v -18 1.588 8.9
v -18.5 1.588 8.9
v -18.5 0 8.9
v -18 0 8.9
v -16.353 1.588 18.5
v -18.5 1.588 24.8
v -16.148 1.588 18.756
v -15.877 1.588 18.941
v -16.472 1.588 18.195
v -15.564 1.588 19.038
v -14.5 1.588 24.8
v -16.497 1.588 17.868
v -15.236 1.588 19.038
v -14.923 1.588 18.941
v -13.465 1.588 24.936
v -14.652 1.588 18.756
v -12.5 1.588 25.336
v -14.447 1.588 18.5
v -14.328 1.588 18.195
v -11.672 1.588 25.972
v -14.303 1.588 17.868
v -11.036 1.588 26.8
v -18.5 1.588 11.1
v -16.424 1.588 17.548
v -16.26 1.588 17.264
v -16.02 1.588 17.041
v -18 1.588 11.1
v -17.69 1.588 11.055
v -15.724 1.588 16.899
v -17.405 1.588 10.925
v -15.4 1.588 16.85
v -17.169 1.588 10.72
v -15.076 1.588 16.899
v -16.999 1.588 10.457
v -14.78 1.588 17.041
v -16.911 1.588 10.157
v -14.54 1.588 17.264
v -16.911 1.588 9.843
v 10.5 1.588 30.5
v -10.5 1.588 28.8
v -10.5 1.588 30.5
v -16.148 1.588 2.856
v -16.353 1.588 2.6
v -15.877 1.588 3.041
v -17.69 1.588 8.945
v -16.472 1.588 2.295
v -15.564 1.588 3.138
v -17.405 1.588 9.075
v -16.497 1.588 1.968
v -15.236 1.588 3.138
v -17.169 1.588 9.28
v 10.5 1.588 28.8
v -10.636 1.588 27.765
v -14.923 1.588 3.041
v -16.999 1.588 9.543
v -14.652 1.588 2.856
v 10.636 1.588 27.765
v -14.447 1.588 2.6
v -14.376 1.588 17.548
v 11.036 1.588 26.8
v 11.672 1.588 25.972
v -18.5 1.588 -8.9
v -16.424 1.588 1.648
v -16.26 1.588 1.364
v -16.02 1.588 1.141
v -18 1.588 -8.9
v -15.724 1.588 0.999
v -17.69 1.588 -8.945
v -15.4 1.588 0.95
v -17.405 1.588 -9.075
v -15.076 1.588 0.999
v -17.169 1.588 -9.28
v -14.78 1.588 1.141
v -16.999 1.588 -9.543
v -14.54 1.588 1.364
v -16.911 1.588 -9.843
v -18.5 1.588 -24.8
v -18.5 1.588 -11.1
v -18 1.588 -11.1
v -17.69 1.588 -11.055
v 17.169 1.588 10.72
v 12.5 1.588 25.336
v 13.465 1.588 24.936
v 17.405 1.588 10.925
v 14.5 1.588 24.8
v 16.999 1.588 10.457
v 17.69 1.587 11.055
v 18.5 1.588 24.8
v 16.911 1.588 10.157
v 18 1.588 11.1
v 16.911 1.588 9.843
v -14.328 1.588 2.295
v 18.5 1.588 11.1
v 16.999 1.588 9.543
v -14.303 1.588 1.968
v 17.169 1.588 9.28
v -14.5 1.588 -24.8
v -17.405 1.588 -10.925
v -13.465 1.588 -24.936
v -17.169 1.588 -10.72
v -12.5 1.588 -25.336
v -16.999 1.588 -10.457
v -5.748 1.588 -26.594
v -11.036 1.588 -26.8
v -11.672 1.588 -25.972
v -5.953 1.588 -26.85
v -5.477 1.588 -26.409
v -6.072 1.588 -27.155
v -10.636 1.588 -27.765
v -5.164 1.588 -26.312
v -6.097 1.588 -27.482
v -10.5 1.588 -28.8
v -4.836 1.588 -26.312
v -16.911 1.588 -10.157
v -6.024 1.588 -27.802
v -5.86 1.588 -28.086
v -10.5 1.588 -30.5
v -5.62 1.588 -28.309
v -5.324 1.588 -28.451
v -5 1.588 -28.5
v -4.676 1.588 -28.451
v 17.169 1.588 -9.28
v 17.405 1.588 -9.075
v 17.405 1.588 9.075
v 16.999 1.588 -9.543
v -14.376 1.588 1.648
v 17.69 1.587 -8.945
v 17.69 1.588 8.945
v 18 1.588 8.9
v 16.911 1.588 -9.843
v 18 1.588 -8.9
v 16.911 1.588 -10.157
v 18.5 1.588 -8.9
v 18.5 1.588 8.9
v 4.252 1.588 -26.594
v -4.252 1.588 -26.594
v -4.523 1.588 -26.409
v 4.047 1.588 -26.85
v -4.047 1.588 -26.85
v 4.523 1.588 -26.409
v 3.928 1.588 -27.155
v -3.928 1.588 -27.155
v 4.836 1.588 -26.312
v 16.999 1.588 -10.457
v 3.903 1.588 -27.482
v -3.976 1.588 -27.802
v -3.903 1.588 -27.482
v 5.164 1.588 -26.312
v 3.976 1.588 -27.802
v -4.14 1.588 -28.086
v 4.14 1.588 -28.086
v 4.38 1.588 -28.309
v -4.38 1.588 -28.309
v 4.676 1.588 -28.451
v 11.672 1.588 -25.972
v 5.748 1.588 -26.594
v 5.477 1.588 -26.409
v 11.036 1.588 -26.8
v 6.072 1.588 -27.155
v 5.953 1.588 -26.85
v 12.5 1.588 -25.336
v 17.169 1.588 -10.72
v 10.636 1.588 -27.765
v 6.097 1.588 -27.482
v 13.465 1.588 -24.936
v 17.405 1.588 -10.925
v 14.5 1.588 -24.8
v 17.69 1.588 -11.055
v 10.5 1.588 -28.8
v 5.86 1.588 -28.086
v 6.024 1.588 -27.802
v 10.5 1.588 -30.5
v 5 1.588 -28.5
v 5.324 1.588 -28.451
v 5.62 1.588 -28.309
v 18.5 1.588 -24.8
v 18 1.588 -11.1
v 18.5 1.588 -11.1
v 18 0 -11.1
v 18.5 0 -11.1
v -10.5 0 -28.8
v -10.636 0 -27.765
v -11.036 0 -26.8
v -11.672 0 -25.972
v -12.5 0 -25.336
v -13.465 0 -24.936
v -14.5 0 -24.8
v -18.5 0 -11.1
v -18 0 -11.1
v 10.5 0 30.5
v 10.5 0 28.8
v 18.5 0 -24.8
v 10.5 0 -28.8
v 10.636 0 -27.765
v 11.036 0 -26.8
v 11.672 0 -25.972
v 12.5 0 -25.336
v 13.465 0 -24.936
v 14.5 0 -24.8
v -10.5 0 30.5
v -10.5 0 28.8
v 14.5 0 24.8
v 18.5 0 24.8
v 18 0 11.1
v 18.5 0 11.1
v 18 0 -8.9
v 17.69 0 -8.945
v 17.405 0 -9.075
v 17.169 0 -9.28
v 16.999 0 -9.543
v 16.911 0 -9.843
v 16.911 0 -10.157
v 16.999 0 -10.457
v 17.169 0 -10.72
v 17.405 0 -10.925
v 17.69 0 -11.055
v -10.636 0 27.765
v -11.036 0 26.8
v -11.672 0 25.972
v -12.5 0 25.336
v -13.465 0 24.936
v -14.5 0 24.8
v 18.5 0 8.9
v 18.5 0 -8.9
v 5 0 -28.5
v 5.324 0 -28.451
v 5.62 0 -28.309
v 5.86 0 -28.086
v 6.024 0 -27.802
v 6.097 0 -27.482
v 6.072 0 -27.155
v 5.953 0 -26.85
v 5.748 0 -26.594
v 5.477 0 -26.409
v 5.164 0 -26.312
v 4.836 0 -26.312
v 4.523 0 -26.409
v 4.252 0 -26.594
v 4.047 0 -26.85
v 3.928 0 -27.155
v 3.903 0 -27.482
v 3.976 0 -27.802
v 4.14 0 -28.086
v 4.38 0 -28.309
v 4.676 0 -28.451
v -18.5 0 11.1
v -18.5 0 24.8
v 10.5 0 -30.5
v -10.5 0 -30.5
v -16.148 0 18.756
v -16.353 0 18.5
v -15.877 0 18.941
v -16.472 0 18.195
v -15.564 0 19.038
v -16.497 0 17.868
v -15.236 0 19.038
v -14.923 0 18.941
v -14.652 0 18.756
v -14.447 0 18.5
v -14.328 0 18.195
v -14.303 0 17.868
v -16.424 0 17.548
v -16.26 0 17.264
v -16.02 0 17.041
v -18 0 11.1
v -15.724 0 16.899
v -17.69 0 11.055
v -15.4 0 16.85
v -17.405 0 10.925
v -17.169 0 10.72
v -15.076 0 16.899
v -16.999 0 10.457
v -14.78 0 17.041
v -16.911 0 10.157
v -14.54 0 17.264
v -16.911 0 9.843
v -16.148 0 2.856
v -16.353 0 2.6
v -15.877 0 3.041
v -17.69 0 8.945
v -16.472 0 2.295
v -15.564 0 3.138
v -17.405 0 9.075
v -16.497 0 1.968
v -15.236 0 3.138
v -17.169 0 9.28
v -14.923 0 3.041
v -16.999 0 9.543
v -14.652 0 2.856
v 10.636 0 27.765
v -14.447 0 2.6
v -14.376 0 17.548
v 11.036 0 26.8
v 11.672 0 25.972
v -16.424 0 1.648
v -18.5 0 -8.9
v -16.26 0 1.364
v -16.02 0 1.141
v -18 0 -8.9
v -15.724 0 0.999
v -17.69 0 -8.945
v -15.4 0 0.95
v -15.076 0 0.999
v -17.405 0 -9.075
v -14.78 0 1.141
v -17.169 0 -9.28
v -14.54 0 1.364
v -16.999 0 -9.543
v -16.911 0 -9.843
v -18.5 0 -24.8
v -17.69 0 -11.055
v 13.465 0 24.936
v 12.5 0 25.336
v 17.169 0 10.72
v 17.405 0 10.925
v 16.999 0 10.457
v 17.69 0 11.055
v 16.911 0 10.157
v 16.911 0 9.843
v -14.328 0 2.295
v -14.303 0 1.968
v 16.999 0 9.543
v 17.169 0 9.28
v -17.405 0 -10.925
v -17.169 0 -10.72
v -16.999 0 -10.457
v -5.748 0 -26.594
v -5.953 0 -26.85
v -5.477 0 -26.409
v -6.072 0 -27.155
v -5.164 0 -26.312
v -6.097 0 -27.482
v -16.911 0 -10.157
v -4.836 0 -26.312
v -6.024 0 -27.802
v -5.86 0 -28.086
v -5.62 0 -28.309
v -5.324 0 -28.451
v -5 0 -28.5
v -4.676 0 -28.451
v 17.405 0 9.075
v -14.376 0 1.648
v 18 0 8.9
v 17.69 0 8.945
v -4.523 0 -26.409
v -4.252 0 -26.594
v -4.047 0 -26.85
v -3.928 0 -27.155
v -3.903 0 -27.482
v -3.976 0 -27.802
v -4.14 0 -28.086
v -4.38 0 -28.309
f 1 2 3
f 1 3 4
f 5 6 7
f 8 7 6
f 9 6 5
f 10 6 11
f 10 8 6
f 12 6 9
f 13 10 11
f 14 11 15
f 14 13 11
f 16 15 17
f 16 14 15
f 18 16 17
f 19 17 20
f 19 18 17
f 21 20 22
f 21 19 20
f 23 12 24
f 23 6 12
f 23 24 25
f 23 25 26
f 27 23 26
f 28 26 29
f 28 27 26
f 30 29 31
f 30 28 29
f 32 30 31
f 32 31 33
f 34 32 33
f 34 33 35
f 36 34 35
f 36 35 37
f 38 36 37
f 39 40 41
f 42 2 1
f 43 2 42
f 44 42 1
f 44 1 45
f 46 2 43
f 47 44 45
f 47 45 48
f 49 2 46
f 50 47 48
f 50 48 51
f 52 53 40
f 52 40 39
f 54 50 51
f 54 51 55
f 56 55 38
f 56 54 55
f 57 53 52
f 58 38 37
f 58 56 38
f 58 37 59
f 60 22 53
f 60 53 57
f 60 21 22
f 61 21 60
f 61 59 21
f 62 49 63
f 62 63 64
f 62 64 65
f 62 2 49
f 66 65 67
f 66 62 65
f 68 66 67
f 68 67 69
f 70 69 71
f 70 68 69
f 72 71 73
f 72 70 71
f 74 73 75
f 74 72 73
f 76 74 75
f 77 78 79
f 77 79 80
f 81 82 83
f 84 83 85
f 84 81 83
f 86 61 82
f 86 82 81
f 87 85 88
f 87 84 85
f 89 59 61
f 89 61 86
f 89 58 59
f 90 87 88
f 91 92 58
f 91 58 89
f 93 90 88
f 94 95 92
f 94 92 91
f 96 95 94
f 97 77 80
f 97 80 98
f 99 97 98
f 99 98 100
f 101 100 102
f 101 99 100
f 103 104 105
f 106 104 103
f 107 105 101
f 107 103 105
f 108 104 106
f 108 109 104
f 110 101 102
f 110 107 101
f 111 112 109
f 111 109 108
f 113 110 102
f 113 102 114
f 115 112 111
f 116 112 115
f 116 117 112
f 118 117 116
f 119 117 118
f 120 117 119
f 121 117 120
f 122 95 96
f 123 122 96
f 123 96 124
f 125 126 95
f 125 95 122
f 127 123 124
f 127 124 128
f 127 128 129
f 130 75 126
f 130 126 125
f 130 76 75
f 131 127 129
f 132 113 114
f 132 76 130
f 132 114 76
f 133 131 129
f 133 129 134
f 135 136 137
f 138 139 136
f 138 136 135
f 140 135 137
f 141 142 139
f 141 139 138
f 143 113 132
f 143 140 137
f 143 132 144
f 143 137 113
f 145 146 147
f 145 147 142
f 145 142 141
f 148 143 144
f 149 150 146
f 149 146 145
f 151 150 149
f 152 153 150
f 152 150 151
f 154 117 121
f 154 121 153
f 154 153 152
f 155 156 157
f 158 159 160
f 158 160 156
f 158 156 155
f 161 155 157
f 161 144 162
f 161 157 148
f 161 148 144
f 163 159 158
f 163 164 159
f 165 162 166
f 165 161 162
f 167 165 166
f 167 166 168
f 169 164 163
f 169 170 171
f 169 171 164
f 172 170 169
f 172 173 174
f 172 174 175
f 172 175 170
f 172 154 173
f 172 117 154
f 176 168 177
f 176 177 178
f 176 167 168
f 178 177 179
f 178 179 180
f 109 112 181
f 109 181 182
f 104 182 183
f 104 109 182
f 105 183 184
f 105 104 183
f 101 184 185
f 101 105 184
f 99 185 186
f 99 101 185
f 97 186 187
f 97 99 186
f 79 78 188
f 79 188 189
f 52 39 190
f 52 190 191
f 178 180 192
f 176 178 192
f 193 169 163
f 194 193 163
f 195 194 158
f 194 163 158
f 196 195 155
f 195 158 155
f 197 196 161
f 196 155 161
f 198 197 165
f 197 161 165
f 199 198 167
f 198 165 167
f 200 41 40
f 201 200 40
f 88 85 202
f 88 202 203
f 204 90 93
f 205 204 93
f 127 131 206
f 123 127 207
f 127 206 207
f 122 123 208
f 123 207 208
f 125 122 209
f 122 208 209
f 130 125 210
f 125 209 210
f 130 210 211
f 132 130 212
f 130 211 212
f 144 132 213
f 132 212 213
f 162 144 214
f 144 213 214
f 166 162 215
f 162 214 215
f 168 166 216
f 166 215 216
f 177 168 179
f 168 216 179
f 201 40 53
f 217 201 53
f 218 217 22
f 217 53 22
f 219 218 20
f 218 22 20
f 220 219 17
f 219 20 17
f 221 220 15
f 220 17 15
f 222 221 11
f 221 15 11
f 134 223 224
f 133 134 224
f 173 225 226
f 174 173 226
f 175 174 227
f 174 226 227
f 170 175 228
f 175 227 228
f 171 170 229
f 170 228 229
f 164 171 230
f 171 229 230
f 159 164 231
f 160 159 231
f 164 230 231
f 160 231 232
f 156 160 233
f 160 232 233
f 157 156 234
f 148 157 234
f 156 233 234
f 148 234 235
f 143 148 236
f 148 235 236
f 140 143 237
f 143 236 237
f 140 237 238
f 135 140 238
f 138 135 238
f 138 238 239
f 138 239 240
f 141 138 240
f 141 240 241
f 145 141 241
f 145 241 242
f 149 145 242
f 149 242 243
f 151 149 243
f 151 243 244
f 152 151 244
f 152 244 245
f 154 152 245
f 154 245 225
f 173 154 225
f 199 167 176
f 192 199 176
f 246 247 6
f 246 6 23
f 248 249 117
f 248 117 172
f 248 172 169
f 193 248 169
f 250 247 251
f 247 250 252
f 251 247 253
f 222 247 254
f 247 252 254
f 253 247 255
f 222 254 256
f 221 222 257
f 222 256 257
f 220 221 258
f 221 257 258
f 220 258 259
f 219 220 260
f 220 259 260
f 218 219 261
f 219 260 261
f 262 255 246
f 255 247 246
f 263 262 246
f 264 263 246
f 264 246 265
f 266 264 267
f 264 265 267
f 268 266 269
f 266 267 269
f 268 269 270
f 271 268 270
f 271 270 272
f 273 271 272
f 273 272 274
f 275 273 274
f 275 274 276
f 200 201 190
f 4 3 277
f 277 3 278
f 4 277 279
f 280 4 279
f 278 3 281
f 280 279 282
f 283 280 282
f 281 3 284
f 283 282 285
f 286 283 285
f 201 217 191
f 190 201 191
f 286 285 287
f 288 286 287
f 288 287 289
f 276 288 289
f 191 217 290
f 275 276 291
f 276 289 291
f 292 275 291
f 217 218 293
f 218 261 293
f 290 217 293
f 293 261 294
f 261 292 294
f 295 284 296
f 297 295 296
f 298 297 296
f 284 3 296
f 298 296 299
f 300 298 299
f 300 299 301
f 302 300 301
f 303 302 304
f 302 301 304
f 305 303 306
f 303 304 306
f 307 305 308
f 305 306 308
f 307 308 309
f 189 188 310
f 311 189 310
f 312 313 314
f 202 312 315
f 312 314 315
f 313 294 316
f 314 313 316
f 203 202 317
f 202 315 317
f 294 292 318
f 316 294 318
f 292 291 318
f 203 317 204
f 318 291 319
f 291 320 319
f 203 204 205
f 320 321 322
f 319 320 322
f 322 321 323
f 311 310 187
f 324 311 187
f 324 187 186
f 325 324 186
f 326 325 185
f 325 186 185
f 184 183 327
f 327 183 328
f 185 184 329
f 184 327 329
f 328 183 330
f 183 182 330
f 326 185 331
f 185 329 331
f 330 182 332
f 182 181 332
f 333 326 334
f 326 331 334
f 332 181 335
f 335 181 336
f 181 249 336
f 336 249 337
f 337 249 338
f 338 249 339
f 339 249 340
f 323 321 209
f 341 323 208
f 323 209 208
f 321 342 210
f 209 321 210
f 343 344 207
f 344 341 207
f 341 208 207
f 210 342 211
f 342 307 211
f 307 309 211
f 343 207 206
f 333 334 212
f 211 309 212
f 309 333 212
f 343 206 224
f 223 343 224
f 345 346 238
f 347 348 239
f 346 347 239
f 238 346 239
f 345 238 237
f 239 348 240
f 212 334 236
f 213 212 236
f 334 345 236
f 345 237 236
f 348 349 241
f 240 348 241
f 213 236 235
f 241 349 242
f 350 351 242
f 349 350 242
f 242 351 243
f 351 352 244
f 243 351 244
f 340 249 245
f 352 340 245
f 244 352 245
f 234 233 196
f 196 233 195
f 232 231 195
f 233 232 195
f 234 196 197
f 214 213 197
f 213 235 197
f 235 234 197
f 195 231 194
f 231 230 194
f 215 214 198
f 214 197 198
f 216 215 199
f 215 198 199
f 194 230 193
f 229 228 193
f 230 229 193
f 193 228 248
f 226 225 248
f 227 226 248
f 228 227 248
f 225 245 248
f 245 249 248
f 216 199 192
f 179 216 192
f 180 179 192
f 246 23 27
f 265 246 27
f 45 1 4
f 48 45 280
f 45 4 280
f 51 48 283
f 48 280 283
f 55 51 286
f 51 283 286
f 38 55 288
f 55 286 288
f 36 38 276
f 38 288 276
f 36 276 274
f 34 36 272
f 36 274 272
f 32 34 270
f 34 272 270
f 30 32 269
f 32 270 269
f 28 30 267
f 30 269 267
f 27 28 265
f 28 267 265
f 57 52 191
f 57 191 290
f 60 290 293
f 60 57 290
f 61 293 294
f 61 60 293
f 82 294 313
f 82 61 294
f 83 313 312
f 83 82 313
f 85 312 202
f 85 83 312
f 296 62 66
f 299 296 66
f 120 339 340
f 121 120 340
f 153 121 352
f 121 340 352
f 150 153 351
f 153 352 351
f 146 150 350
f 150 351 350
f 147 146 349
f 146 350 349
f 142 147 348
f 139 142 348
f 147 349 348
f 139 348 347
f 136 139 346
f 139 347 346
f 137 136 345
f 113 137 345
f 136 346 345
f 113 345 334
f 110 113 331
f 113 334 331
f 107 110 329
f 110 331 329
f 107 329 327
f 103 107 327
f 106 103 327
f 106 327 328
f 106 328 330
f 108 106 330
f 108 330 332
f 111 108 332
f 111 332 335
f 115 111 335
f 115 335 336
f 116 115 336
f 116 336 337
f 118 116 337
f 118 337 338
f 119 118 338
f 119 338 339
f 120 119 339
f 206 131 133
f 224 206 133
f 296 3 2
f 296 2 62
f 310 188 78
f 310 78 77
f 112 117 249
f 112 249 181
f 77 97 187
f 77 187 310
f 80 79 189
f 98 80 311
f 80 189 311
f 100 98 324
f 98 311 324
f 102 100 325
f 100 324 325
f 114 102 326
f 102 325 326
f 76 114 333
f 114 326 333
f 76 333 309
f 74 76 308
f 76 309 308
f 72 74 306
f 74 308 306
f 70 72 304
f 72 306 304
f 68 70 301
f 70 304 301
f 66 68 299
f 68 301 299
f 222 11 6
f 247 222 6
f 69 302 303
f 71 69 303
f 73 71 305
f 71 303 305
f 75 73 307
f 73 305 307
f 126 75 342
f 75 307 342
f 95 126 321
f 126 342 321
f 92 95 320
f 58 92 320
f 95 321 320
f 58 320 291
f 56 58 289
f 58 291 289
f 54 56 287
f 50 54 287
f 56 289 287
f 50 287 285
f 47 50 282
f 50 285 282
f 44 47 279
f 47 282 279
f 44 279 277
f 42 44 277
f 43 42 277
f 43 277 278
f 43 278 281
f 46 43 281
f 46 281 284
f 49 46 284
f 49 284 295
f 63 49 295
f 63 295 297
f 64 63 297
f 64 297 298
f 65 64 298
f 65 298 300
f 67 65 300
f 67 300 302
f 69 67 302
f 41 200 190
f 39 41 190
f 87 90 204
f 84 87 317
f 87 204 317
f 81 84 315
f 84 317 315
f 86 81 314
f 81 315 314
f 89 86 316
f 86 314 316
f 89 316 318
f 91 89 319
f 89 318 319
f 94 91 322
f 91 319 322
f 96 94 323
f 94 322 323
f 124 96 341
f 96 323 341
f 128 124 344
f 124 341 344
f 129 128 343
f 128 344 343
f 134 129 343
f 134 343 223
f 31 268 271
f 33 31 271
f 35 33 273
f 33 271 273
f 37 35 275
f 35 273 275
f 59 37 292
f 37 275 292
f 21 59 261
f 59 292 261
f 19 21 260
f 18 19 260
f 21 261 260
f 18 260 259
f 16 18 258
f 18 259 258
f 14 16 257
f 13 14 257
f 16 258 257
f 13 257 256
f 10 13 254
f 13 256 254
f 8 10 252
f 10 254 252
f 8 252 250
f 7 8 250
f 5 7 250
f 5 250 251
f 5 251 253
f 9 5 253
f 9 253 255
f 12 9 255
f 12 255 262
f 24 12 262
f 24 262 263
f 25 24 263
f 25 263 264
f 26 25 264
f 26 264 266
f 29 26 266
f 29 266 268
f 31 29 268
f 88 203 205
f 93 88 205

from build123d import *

# Parameters (mm, degrees)
SKETCH1_W                                   = 37
SKETCH1_H                                   = 61
BASE_EXTRUSION_DEPTH                        = 1.5875
M2_CLEARANCE_HOLE3_D                        = 2.2
SKETCH8_W                                   = 0.5
SKETCH8_H                                   = 2.2
SIDE_SLOTS_DEPTH                            = 36.707424386
CORNER_BOSS_CLEARANCE_DEPTH                 = 36.707424386
CORNER_BOSS_CLEARANCE_MIRROR_2_COPY_1_DEPTH = 36.707424386
SKETCH10_R                                  = 1.1
AC_WIRE_HOLES_DEPTH                         = 36.707424386


with BuildPart() as part:
    # Sketch1 → Base Extrusion (new body)
    with BuildSketch(Plane(origin=(0, 0, 0), x_dir=(1, 0, 0), z_dir=(0, 1, 0))):
        Rectangle(SKETCH1_W, SKETCH1_H)
    extrude(amount=BASE_EXTRUSION_DEPTH)

    # M2 Clearance Hole3 (through all)
    with Locations(Plane(origin=(0, 1.5875, 0), x_dir=(1, 0, 0), z_dir=(0, 1, 0))):
        with Locations((-18, 10), (-18, -10), (18, -10), (18, 10)):
            Hole(M2_CLEARANCE_HOLE3_D / 2)

    # Sketch8 → Side Slots (cut, through all)
    with BuildSketch(Plane(origin=(0, 1.5875, 0), x_dir=(1, 0, 0), z_dir=(0, 1, 0))):
        with Locations((-18.25, 10)):
            Rectangle(SKETCH8_W, SKETCH8_H)
        with Locations((-18.25, -10)):
            Rectangle(SKETCH8_W, SKETCH8_H)
        with Locations((18.25, 10)):
            Rectangle(SKETCH8_W, SKETCH8_H)
        with Locations((18.25, -10)):
            Rectangle(SKETCH8_W, SKETCH8_H)
    extrude(amount=-SIDE_SLOTS_DEPTH, mode=Mode.SUBTRACT)

    # Sketch9 → Corner Boss Clearance (cut, through all)
    with BuildSketch(Plane(origin=(0, 1.5875, 0), x_dir=(1, 0, 0), z_dir=(0, 1, 0))):
        with BuildLine():
            Line((-18.5, -32.8), (-10.5, -32.8))
            Line((-10.5, -32.8), (-10.5, -28.8))
            ThreePointArc((-10.5, -28.8), (-11.671572875, -25.971572875), (-14.5, -24.8))
            Line((-14.5, -24.8), (-18.5, -24.8))
            Line((-18.5, -24.8), (-18.5, -32.8))
        make_face()
    corner_boss_clearance = extrude(amount=-CORNER_BOSS_CLEARANCE_DEPTH, mode=Mode.SUBTRACT)

    # Corner Boss Clearance Mirror: Corner Boss Clearance across plane
    add(corner_boss_clearance.mirror(Plane(origin=(0, 0, 0), x_dir=(0, 0, 1), z_dir=(1, 0, 0))), mode=Mode.SUBTRACT)

    # Corner Boss Clearance Mirror 2: Corner Boss Clearance across plane
    add(corner_boss_clearance.mirror(Plane.XY), mode=Mode.SUBTRACT)

    # Corner Boss Clearance Mirror 2 copy 1 sk → Corner Boss Clearance Mirror 2 copy 1 (cut, through all)
    with BuildSketch(Plane(origin=(0, 1.5875, 0), x_dir=(-1, 0, 0), z_dir=(0, 1, 0))):
        with BuildLine():
            Line((-18.5, -32.8), (-10.5, -32.8))
            Line((-10.5, -32.8), (-10.5, -28.8))
            ThreePointArc((-10.5, -28.8), (-11.671572875, -25.971572875), (-14.5, -24.8))
            Line((-14.5, -24.8), (-18.5, -24.8))
            Line((-18.5, -24.8), (-18.5, -32.8))
        make_face()
    extrude(amount=-CORNER_BOSS_CLEARANCE_MIRROR_2_COPY_1_DEPTH, mode=Mode.SUBTRACT)

    # Sketch10 → AC Wire Holes (cut, through all)
    with BuildSketch(Plane.XZ):
        with Locations(Location((-5, -27.4, 0), (0, 0, 270))):
            Circle(SKETCH10_R)
        with Locations(Location((5, -27.4, 0), (0, 0, 270))):
            Circle(SKETCH10_R)
        with Locations(Location((-15.4, 17.95, 0), (0, 0, 270))):
            Circle(SKETCH10_R)
        with Locations(Location((-15.4, 2.05, 0), (0, 0, 270))):
            Circle(SKETCH10_R)
    extrude(amount=-AC_WIRE_HOLES_DEPTH, mode=Mode.SUBTRACT)


solid = part.part
